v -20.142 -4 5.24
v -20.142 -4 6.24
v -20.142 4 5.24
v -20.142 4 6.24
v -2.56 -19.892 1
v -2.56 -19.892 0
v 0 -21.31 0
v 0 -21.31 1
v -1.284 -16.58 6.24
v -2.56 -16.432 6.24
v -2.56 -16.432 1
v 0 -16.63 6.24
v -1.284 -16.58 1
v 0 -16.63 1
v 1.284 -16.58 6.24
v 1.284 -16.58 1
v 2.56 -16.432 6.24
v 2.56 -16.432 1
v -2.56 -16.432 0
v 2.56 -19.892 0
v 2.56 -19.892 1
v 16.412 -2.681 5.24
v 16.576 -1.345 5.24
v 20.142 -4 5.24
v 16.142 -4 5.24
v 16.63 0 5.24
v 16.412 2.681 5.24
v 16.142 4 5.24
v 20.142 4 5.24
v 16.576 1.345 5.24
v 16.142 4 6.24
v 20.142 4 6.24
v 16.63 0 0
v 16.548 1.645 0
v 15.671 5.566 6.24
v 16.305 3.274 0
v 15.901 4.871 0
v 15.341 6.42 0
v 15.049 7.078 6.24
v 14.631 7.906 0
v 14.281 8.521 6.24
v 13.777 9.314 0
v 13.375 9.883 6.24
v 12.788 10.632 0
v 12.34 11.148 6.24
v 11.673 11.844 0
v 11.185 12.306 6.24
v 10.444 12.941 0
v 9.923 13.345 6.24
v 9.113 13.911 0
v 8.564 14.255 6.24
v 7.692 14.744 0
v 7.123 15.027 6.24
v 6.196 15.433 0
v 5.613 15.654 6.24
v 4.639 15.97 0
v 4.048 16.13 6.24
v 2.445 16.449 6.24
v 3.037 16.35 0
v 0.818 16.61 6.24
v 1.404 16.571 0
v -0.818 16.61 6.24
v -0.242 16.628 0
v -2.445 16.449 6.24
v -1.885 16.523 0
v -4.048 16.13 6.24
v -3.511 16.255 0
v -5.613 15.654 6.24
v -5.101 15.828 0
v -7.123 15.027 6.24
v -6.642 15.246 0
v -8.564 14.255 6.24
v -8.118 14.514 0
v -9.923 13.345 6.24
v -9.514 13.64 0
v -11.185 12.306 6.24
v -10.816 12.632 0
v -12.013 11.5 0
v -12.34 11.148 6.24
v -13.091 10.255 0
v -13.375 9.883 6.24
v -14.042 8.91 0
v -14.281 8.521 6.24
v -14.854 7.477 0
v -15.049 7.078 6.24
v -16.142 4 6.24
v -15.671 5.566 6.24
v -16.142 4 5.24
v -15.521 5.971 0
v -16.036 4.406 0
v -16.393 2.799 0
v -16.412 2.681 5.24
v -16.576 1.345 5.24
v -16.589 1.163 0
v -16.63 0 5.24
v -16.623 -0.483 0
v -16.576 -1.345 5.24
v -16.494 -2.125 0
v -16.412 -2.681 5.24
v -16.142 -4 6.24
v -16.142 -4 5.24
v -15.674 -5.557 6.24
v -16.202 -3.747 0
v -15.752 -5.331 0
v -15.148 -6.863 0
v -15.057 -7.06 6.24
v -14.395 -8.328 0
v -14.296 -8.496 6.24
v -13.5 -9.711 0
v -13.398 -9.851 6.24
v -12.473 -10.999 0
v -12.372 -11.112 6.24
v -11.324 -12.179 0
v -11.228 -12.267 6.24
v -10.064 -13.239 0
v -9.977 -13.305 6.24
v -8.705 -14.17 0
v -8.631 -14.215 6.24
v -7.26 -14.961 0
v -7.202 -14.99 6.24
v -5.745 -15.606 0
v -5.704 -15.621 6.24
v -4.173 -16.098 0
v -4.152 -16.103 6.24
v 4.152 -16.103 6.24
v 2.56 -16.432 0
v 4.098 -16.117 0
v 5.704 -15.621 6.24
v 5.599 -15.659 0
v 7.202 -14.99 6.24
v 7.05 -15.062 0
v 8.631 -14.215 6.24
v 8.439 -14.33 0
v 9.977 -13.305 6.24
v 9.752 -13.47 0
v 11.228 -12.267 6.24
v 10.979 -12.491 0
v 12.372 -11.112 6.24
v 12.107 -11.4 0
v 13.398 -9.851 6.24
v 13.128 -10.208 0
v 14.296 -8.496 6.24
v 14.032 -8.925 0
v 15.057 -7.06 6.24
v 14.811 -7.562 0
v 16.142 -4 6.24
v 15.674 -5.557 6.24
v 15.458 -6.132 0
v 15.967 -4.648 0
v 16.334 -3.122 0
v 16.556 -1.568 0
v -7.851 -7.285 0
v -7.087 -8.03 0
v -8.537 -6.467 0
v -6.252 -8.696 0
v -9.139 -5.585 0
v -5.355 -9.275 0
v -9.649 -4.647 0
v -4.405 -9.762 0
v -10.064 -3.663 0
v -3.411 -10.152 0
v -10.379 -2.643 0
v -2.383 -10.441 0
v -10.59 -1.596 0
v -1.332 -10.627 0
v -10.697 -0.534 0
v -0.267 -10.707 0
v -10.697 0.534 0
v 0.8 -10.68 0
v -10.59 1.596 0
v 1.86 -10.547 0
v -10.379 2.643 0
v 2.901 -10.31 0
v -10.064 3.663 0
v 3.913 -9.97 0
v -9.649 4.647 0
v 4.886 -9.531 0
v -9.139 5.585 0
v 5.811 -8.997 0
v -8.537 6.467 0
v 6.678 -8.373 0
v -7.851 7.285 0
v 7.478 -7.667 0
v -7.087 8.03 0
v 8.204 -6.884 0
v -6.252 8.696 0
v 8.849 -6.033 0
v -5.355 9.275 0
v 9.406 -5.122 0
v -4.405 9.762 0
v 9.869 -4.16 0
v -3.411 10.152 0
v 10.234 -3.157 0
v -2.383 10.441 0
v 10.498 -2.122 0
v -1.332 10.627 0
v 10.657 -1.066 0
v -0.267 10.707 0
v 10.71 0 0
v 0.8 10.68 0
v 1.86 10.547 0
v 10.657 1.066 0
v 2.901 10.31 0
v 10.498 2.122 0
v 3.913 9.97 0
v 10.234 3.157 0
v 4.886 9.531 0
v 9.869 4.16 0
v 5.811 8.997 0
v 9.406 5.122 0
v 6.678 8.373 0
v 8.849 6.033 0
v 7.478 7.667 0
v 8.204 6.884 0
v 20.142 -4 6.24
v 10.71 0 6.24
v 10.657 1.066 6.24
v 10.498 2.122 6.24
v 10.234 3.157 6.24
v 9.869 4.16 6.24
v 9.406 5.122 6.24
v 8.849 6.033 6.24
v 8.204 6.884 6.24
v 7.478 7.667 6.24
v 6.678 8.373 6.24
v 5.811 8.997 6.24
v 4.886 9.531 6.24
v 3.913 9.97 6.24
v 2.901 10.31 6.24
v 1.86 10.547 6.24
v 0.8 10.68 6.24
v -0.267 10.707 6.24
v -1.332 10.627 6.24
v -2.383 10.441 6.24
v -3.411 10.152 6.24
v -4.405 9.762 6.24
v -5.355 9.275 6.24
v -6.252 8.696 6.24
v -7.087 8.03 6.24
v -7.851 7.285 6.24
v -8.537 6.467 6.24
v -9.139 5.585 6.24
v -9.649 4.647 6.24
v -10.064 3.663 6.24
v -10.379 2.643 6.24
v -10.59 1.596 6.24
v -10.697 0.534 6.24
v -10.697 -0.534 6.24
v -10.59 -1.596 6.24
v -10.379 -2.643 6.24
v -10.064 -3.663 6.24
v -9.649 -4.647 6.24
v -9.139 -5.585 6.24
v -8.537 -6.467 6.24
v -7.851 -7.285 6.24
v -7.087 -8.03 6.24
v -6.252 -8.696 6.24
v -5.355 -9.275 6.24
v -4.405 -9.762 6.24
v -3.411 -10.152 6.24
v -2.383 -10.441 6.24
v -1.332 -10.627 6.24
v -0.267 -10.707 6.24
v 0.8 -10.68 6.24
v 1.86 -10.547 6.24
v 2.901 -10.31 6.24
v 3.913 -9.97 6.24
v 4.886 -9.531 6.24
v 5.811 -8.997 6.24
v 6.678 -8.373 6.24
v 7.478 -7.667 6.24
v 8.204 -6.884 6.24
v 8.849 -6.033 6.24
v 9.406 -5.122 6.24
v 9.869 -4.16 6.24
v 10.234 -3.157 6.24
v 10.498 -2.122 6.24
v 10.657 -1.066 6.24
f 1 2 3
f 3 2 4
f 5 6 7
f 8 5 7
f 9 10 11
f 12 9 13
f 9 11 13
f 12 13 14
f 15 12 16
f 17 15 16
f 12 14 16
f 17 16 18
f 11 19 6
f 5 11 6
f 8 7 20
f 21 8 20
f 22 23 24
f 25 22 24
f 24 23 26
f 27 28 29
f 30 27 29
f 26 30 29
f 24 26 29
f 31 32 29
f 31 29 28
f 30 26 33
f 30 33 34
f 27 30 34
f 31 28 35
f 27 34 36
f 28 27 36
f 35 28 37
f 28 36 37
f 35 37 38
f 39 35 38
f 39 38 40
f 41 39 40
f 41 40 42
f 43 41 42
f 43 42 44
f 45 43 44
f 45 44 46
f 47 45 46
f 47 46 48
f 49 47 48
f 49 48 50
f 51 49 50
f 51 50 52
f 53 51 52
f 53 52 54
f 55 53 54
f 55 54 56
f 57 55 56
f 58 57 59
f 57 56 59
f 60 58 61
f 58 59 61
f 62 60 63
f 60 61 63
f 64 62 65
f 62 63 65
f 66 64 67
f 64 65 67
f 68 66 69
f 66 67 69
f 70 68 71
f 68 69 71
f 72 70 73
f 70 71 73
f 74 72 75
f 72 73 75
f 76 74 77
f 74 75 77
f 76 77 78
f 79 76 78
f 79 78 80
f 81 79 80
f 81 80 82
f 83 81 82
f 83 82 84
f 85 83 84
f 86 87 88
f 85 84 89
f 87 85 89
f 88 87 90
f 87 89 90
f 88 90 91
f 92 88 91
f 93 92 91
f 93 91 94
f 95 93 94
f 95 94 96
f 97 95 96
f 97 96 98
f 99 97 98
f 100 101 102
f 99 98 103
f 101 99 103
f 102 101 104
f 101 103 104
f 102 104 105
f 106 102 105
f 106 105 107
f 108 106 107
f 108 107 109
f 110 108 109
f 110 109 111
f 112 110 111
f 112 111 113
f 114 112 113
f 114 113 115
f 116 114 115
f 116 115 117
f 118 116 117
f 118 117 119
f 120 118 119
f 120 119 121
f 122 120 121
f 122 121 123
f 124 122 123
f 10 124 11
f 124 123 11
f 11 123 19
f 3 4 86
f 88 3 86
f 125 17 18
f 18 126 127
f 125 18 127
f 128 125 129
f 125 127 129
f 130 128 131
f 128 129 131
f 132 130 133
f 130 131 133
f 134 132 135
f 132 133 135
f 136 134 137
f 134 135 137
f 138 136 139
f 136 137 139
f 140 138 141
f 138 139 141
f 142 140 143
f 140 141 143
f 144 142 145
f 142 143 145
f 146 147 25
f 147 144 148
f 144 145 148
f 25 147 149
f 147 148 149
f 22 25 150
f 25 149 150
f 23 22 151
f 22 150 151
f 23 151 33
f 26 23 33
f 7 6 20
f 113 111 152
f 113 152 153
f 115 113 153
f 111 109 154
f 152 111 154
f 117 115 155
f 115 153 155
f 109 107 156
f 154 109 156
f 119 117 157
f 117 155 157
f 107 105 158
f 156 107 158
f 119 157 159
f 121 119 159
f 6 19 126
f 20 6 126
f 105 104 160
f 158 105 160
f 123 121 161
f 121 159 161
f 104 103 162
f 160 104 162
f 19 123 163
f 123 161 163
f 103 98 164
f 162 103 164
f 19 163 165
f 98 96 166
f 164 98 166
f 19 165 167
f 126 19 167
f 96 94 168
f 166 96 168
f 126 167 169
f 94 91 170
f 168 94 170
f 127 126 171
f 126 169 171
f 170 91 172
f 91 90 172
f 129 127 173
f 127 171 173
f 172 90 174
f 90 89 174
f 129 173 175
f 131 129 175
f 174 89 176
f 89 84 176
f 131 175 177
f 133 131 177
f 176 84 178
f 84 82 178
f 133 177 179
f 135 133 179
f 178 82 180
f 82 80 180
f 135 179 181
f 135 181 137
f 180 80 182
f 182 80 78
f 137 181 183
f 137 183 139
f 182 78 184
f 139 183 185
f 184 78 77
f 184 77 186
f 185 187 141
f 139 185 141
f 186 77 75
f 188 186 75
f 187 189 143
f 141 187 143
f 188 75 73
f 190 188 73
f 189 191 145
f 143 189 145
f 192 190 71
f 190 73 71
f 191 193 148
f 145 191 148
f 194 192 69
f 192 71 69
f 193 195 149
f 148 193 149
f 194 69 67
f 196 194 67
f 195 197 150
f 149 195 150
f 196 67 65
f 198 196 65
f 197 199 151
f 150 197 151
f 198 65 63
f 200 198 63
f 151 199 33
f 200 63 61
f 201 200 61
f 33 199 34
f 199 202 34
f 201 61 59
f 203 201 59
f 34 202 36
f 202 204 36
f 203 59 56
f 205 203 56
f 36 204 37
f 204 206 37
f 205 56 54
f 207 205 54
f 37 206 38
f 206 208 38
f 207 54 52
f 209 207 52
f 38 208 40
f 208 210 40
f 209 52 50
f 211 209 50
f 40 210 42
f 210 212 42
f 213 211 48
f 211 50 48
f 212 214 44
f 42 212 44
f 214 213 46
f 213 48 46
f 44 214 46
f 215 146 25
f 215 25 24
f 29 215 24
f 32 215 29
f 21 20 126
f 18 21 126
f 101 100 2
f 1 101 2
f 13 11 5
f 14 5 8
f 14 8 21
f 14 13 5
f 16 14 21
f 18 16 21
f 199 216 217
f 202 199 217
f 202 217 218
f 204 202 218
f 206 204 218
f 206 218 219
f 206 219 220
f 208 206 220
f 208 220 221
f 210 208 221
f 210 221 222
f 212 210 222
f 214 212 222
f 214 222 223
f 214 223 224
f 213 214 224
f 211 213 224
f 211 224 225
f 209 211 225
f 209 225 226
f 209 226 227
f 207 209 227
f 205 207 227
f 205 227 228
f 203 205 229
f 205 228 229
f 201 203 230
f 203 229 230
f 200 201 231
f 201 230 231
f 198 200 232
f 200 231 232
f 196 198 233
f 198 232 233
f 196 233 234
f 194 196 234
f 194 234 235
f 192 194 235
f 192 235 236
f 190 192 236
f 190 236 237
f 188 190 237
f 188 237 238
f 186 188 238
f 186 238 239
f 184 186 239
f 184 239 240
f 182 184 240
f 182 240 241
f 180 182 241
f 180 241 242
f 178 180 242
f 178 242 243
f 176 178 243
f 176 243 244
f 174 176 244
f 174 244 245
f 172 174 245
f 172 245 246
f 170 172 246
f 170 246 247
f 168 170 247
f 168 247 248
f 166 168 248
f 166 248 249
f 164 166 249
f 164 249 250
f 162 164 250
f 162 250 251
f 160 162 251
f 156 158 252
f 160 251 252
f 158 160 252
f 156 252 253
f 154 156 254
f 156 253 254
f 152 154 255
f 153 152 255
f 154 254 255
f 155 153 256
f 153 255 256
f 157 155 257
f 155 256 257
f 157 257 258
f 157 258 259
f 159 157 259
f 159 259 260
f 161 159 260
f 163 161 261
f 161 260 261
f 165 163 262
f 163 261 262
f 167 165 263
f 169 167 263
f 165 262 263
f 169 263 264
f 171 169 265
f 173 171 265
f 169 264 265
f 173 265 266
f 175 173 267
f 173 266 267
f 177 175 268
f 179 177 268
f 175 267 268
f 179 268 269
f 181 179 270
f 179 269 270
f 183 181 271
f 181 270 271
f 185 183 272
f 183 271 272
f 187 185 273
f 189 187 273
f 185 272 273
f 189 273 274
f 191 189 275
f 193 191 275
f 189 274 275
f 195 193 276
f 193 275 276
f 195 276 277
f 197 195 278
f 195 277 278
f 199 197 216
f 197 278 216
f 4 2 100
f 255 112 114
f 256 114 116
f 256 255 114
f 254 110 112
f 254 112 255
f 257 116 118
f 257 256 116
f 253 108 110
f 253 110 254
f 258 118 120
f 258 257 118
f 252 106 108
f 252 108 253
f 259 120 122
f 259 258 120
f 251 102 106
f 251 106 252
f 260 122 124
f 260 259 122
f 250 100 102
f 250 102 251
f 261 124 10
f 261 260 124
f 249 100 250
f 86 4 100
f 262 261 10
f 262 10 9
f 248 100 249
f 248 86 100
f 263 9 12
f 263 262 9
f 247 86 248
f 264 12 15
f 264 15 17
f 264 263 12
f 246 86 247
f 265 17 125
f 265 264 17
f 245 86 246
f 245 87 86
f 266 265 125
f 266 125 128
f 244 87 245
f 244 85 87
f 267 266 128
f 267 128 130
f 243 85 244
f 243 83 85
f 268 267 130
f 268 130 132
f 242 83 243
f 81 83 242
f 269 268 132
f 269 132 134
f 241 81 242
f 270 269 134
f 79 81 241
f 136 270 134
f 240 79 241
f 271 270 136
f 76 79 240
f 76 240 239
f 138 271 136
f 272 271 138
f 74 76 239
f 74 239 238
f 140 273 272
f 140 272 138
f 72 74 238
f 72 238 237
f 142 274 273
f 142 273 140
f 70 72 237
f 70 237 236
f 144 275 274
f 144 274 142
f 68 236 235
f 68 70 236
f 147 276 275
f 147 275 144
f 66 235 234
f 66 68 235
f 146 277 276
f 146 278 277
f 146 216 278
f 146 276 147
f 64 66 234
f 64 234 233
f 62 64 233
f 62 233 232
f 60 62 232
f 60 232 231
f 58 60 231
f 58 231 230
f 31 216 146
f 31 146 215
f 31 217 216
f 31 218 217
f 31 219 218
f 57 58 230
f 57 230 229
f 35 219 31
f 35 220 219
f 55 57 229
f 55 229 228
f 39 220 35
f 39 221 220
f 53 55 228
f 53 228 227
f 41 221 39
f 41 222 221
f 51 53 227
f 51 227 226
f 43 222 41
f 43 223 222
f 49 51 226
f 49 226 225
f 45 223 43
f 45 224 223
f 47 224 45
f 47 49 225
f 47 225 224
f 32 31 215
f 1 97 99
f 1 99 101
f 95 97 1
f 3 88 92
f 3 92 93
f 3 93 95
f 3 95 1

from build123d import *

# Parameters (mm, degrees)
F1_DEPTH = 6.24
F2_DEPTH = 1
F3_R     = 10.71
F4_DEPTH = 6.241
F6_DEPTH = 1


# Not quite as in the source:
# - a pattern or mirror of a feature is missing from the dataset's text; its kind, count and spacing are read off the source's solid


with BuildPart() as f1:
    # F0 (on Top) → F1 (new body)
    with BuildSketch(Plane.XY):
        with BuildLine():
            ThreePointArc((2.56, -16.4317771407), (12.6318981155, -10.8162863313), (16.63, 0))
            ThreePointArc((16.63, 0), (-10.8162863313, 12.6318981155), (-2.56, -16.4317771407))
            ThreePointArc((-2.56, -16.4317771407), (0, -16.63), (2.56, -16.4317771407))
        make_face()
    extrude(amount=F1_DEPTH)

    # F0 (on Top) → F2 (join)
    with BuildSketch(Plane.XY):
        with BuildLine():
            ThreePointArc((2.56, -16.4317771407), (0, -16.63), (-2.56, -16.4317771407))
            Line((-2.56, -16.4317771407), (-2.56, -19.8917771407))
            Line((-2.56, -19.8917771407), (0, -21.31))
            Line((0, -21.31), (2.56, -19.8917771407))
            Line((2.56, -19.8917771407), (2.56, -16.4317771407))
        make_face()
    extrude(amount=F2_DEPTH)

    # F3 (on face) → F4 (cut, through all)
    with BuildSketch(Plane.XY.offset(6.24)):
        Circle(F3_R)
    extrude(amount=-F4_DEPTH, mode=Mode.SUBTRACT)

    # F5 (on face) → F6 (join)
    with BuildSketch(Plane.XY.offset(6.24)):
        with BuildLine():
            Line((20.1417749953, 4), (16.1417749953, 4))
            ThreePointArc((16.1417749953, 4), (16.5074925136, 2.0148426524), (16.63, 0))
            ThreePointArc((16.63, 0), (16.5074925136, -2.0148426524), (16.1417749953, -4))
            Line((16.1417749953, -4), (20.1417749953, -4))
            Line((20.1417749953, -4), (20.1417749953, 4))
        make_face()
    f6 = extrude(amount=-F6_DEPTH)

    # F6_copies: F6 across plane
    add(f6.mirror(Plane(origin=(0, 0, 0), x_dir=(0, 0, -1), z_dir=(-1, 0, 0))))


solid = f1.part
